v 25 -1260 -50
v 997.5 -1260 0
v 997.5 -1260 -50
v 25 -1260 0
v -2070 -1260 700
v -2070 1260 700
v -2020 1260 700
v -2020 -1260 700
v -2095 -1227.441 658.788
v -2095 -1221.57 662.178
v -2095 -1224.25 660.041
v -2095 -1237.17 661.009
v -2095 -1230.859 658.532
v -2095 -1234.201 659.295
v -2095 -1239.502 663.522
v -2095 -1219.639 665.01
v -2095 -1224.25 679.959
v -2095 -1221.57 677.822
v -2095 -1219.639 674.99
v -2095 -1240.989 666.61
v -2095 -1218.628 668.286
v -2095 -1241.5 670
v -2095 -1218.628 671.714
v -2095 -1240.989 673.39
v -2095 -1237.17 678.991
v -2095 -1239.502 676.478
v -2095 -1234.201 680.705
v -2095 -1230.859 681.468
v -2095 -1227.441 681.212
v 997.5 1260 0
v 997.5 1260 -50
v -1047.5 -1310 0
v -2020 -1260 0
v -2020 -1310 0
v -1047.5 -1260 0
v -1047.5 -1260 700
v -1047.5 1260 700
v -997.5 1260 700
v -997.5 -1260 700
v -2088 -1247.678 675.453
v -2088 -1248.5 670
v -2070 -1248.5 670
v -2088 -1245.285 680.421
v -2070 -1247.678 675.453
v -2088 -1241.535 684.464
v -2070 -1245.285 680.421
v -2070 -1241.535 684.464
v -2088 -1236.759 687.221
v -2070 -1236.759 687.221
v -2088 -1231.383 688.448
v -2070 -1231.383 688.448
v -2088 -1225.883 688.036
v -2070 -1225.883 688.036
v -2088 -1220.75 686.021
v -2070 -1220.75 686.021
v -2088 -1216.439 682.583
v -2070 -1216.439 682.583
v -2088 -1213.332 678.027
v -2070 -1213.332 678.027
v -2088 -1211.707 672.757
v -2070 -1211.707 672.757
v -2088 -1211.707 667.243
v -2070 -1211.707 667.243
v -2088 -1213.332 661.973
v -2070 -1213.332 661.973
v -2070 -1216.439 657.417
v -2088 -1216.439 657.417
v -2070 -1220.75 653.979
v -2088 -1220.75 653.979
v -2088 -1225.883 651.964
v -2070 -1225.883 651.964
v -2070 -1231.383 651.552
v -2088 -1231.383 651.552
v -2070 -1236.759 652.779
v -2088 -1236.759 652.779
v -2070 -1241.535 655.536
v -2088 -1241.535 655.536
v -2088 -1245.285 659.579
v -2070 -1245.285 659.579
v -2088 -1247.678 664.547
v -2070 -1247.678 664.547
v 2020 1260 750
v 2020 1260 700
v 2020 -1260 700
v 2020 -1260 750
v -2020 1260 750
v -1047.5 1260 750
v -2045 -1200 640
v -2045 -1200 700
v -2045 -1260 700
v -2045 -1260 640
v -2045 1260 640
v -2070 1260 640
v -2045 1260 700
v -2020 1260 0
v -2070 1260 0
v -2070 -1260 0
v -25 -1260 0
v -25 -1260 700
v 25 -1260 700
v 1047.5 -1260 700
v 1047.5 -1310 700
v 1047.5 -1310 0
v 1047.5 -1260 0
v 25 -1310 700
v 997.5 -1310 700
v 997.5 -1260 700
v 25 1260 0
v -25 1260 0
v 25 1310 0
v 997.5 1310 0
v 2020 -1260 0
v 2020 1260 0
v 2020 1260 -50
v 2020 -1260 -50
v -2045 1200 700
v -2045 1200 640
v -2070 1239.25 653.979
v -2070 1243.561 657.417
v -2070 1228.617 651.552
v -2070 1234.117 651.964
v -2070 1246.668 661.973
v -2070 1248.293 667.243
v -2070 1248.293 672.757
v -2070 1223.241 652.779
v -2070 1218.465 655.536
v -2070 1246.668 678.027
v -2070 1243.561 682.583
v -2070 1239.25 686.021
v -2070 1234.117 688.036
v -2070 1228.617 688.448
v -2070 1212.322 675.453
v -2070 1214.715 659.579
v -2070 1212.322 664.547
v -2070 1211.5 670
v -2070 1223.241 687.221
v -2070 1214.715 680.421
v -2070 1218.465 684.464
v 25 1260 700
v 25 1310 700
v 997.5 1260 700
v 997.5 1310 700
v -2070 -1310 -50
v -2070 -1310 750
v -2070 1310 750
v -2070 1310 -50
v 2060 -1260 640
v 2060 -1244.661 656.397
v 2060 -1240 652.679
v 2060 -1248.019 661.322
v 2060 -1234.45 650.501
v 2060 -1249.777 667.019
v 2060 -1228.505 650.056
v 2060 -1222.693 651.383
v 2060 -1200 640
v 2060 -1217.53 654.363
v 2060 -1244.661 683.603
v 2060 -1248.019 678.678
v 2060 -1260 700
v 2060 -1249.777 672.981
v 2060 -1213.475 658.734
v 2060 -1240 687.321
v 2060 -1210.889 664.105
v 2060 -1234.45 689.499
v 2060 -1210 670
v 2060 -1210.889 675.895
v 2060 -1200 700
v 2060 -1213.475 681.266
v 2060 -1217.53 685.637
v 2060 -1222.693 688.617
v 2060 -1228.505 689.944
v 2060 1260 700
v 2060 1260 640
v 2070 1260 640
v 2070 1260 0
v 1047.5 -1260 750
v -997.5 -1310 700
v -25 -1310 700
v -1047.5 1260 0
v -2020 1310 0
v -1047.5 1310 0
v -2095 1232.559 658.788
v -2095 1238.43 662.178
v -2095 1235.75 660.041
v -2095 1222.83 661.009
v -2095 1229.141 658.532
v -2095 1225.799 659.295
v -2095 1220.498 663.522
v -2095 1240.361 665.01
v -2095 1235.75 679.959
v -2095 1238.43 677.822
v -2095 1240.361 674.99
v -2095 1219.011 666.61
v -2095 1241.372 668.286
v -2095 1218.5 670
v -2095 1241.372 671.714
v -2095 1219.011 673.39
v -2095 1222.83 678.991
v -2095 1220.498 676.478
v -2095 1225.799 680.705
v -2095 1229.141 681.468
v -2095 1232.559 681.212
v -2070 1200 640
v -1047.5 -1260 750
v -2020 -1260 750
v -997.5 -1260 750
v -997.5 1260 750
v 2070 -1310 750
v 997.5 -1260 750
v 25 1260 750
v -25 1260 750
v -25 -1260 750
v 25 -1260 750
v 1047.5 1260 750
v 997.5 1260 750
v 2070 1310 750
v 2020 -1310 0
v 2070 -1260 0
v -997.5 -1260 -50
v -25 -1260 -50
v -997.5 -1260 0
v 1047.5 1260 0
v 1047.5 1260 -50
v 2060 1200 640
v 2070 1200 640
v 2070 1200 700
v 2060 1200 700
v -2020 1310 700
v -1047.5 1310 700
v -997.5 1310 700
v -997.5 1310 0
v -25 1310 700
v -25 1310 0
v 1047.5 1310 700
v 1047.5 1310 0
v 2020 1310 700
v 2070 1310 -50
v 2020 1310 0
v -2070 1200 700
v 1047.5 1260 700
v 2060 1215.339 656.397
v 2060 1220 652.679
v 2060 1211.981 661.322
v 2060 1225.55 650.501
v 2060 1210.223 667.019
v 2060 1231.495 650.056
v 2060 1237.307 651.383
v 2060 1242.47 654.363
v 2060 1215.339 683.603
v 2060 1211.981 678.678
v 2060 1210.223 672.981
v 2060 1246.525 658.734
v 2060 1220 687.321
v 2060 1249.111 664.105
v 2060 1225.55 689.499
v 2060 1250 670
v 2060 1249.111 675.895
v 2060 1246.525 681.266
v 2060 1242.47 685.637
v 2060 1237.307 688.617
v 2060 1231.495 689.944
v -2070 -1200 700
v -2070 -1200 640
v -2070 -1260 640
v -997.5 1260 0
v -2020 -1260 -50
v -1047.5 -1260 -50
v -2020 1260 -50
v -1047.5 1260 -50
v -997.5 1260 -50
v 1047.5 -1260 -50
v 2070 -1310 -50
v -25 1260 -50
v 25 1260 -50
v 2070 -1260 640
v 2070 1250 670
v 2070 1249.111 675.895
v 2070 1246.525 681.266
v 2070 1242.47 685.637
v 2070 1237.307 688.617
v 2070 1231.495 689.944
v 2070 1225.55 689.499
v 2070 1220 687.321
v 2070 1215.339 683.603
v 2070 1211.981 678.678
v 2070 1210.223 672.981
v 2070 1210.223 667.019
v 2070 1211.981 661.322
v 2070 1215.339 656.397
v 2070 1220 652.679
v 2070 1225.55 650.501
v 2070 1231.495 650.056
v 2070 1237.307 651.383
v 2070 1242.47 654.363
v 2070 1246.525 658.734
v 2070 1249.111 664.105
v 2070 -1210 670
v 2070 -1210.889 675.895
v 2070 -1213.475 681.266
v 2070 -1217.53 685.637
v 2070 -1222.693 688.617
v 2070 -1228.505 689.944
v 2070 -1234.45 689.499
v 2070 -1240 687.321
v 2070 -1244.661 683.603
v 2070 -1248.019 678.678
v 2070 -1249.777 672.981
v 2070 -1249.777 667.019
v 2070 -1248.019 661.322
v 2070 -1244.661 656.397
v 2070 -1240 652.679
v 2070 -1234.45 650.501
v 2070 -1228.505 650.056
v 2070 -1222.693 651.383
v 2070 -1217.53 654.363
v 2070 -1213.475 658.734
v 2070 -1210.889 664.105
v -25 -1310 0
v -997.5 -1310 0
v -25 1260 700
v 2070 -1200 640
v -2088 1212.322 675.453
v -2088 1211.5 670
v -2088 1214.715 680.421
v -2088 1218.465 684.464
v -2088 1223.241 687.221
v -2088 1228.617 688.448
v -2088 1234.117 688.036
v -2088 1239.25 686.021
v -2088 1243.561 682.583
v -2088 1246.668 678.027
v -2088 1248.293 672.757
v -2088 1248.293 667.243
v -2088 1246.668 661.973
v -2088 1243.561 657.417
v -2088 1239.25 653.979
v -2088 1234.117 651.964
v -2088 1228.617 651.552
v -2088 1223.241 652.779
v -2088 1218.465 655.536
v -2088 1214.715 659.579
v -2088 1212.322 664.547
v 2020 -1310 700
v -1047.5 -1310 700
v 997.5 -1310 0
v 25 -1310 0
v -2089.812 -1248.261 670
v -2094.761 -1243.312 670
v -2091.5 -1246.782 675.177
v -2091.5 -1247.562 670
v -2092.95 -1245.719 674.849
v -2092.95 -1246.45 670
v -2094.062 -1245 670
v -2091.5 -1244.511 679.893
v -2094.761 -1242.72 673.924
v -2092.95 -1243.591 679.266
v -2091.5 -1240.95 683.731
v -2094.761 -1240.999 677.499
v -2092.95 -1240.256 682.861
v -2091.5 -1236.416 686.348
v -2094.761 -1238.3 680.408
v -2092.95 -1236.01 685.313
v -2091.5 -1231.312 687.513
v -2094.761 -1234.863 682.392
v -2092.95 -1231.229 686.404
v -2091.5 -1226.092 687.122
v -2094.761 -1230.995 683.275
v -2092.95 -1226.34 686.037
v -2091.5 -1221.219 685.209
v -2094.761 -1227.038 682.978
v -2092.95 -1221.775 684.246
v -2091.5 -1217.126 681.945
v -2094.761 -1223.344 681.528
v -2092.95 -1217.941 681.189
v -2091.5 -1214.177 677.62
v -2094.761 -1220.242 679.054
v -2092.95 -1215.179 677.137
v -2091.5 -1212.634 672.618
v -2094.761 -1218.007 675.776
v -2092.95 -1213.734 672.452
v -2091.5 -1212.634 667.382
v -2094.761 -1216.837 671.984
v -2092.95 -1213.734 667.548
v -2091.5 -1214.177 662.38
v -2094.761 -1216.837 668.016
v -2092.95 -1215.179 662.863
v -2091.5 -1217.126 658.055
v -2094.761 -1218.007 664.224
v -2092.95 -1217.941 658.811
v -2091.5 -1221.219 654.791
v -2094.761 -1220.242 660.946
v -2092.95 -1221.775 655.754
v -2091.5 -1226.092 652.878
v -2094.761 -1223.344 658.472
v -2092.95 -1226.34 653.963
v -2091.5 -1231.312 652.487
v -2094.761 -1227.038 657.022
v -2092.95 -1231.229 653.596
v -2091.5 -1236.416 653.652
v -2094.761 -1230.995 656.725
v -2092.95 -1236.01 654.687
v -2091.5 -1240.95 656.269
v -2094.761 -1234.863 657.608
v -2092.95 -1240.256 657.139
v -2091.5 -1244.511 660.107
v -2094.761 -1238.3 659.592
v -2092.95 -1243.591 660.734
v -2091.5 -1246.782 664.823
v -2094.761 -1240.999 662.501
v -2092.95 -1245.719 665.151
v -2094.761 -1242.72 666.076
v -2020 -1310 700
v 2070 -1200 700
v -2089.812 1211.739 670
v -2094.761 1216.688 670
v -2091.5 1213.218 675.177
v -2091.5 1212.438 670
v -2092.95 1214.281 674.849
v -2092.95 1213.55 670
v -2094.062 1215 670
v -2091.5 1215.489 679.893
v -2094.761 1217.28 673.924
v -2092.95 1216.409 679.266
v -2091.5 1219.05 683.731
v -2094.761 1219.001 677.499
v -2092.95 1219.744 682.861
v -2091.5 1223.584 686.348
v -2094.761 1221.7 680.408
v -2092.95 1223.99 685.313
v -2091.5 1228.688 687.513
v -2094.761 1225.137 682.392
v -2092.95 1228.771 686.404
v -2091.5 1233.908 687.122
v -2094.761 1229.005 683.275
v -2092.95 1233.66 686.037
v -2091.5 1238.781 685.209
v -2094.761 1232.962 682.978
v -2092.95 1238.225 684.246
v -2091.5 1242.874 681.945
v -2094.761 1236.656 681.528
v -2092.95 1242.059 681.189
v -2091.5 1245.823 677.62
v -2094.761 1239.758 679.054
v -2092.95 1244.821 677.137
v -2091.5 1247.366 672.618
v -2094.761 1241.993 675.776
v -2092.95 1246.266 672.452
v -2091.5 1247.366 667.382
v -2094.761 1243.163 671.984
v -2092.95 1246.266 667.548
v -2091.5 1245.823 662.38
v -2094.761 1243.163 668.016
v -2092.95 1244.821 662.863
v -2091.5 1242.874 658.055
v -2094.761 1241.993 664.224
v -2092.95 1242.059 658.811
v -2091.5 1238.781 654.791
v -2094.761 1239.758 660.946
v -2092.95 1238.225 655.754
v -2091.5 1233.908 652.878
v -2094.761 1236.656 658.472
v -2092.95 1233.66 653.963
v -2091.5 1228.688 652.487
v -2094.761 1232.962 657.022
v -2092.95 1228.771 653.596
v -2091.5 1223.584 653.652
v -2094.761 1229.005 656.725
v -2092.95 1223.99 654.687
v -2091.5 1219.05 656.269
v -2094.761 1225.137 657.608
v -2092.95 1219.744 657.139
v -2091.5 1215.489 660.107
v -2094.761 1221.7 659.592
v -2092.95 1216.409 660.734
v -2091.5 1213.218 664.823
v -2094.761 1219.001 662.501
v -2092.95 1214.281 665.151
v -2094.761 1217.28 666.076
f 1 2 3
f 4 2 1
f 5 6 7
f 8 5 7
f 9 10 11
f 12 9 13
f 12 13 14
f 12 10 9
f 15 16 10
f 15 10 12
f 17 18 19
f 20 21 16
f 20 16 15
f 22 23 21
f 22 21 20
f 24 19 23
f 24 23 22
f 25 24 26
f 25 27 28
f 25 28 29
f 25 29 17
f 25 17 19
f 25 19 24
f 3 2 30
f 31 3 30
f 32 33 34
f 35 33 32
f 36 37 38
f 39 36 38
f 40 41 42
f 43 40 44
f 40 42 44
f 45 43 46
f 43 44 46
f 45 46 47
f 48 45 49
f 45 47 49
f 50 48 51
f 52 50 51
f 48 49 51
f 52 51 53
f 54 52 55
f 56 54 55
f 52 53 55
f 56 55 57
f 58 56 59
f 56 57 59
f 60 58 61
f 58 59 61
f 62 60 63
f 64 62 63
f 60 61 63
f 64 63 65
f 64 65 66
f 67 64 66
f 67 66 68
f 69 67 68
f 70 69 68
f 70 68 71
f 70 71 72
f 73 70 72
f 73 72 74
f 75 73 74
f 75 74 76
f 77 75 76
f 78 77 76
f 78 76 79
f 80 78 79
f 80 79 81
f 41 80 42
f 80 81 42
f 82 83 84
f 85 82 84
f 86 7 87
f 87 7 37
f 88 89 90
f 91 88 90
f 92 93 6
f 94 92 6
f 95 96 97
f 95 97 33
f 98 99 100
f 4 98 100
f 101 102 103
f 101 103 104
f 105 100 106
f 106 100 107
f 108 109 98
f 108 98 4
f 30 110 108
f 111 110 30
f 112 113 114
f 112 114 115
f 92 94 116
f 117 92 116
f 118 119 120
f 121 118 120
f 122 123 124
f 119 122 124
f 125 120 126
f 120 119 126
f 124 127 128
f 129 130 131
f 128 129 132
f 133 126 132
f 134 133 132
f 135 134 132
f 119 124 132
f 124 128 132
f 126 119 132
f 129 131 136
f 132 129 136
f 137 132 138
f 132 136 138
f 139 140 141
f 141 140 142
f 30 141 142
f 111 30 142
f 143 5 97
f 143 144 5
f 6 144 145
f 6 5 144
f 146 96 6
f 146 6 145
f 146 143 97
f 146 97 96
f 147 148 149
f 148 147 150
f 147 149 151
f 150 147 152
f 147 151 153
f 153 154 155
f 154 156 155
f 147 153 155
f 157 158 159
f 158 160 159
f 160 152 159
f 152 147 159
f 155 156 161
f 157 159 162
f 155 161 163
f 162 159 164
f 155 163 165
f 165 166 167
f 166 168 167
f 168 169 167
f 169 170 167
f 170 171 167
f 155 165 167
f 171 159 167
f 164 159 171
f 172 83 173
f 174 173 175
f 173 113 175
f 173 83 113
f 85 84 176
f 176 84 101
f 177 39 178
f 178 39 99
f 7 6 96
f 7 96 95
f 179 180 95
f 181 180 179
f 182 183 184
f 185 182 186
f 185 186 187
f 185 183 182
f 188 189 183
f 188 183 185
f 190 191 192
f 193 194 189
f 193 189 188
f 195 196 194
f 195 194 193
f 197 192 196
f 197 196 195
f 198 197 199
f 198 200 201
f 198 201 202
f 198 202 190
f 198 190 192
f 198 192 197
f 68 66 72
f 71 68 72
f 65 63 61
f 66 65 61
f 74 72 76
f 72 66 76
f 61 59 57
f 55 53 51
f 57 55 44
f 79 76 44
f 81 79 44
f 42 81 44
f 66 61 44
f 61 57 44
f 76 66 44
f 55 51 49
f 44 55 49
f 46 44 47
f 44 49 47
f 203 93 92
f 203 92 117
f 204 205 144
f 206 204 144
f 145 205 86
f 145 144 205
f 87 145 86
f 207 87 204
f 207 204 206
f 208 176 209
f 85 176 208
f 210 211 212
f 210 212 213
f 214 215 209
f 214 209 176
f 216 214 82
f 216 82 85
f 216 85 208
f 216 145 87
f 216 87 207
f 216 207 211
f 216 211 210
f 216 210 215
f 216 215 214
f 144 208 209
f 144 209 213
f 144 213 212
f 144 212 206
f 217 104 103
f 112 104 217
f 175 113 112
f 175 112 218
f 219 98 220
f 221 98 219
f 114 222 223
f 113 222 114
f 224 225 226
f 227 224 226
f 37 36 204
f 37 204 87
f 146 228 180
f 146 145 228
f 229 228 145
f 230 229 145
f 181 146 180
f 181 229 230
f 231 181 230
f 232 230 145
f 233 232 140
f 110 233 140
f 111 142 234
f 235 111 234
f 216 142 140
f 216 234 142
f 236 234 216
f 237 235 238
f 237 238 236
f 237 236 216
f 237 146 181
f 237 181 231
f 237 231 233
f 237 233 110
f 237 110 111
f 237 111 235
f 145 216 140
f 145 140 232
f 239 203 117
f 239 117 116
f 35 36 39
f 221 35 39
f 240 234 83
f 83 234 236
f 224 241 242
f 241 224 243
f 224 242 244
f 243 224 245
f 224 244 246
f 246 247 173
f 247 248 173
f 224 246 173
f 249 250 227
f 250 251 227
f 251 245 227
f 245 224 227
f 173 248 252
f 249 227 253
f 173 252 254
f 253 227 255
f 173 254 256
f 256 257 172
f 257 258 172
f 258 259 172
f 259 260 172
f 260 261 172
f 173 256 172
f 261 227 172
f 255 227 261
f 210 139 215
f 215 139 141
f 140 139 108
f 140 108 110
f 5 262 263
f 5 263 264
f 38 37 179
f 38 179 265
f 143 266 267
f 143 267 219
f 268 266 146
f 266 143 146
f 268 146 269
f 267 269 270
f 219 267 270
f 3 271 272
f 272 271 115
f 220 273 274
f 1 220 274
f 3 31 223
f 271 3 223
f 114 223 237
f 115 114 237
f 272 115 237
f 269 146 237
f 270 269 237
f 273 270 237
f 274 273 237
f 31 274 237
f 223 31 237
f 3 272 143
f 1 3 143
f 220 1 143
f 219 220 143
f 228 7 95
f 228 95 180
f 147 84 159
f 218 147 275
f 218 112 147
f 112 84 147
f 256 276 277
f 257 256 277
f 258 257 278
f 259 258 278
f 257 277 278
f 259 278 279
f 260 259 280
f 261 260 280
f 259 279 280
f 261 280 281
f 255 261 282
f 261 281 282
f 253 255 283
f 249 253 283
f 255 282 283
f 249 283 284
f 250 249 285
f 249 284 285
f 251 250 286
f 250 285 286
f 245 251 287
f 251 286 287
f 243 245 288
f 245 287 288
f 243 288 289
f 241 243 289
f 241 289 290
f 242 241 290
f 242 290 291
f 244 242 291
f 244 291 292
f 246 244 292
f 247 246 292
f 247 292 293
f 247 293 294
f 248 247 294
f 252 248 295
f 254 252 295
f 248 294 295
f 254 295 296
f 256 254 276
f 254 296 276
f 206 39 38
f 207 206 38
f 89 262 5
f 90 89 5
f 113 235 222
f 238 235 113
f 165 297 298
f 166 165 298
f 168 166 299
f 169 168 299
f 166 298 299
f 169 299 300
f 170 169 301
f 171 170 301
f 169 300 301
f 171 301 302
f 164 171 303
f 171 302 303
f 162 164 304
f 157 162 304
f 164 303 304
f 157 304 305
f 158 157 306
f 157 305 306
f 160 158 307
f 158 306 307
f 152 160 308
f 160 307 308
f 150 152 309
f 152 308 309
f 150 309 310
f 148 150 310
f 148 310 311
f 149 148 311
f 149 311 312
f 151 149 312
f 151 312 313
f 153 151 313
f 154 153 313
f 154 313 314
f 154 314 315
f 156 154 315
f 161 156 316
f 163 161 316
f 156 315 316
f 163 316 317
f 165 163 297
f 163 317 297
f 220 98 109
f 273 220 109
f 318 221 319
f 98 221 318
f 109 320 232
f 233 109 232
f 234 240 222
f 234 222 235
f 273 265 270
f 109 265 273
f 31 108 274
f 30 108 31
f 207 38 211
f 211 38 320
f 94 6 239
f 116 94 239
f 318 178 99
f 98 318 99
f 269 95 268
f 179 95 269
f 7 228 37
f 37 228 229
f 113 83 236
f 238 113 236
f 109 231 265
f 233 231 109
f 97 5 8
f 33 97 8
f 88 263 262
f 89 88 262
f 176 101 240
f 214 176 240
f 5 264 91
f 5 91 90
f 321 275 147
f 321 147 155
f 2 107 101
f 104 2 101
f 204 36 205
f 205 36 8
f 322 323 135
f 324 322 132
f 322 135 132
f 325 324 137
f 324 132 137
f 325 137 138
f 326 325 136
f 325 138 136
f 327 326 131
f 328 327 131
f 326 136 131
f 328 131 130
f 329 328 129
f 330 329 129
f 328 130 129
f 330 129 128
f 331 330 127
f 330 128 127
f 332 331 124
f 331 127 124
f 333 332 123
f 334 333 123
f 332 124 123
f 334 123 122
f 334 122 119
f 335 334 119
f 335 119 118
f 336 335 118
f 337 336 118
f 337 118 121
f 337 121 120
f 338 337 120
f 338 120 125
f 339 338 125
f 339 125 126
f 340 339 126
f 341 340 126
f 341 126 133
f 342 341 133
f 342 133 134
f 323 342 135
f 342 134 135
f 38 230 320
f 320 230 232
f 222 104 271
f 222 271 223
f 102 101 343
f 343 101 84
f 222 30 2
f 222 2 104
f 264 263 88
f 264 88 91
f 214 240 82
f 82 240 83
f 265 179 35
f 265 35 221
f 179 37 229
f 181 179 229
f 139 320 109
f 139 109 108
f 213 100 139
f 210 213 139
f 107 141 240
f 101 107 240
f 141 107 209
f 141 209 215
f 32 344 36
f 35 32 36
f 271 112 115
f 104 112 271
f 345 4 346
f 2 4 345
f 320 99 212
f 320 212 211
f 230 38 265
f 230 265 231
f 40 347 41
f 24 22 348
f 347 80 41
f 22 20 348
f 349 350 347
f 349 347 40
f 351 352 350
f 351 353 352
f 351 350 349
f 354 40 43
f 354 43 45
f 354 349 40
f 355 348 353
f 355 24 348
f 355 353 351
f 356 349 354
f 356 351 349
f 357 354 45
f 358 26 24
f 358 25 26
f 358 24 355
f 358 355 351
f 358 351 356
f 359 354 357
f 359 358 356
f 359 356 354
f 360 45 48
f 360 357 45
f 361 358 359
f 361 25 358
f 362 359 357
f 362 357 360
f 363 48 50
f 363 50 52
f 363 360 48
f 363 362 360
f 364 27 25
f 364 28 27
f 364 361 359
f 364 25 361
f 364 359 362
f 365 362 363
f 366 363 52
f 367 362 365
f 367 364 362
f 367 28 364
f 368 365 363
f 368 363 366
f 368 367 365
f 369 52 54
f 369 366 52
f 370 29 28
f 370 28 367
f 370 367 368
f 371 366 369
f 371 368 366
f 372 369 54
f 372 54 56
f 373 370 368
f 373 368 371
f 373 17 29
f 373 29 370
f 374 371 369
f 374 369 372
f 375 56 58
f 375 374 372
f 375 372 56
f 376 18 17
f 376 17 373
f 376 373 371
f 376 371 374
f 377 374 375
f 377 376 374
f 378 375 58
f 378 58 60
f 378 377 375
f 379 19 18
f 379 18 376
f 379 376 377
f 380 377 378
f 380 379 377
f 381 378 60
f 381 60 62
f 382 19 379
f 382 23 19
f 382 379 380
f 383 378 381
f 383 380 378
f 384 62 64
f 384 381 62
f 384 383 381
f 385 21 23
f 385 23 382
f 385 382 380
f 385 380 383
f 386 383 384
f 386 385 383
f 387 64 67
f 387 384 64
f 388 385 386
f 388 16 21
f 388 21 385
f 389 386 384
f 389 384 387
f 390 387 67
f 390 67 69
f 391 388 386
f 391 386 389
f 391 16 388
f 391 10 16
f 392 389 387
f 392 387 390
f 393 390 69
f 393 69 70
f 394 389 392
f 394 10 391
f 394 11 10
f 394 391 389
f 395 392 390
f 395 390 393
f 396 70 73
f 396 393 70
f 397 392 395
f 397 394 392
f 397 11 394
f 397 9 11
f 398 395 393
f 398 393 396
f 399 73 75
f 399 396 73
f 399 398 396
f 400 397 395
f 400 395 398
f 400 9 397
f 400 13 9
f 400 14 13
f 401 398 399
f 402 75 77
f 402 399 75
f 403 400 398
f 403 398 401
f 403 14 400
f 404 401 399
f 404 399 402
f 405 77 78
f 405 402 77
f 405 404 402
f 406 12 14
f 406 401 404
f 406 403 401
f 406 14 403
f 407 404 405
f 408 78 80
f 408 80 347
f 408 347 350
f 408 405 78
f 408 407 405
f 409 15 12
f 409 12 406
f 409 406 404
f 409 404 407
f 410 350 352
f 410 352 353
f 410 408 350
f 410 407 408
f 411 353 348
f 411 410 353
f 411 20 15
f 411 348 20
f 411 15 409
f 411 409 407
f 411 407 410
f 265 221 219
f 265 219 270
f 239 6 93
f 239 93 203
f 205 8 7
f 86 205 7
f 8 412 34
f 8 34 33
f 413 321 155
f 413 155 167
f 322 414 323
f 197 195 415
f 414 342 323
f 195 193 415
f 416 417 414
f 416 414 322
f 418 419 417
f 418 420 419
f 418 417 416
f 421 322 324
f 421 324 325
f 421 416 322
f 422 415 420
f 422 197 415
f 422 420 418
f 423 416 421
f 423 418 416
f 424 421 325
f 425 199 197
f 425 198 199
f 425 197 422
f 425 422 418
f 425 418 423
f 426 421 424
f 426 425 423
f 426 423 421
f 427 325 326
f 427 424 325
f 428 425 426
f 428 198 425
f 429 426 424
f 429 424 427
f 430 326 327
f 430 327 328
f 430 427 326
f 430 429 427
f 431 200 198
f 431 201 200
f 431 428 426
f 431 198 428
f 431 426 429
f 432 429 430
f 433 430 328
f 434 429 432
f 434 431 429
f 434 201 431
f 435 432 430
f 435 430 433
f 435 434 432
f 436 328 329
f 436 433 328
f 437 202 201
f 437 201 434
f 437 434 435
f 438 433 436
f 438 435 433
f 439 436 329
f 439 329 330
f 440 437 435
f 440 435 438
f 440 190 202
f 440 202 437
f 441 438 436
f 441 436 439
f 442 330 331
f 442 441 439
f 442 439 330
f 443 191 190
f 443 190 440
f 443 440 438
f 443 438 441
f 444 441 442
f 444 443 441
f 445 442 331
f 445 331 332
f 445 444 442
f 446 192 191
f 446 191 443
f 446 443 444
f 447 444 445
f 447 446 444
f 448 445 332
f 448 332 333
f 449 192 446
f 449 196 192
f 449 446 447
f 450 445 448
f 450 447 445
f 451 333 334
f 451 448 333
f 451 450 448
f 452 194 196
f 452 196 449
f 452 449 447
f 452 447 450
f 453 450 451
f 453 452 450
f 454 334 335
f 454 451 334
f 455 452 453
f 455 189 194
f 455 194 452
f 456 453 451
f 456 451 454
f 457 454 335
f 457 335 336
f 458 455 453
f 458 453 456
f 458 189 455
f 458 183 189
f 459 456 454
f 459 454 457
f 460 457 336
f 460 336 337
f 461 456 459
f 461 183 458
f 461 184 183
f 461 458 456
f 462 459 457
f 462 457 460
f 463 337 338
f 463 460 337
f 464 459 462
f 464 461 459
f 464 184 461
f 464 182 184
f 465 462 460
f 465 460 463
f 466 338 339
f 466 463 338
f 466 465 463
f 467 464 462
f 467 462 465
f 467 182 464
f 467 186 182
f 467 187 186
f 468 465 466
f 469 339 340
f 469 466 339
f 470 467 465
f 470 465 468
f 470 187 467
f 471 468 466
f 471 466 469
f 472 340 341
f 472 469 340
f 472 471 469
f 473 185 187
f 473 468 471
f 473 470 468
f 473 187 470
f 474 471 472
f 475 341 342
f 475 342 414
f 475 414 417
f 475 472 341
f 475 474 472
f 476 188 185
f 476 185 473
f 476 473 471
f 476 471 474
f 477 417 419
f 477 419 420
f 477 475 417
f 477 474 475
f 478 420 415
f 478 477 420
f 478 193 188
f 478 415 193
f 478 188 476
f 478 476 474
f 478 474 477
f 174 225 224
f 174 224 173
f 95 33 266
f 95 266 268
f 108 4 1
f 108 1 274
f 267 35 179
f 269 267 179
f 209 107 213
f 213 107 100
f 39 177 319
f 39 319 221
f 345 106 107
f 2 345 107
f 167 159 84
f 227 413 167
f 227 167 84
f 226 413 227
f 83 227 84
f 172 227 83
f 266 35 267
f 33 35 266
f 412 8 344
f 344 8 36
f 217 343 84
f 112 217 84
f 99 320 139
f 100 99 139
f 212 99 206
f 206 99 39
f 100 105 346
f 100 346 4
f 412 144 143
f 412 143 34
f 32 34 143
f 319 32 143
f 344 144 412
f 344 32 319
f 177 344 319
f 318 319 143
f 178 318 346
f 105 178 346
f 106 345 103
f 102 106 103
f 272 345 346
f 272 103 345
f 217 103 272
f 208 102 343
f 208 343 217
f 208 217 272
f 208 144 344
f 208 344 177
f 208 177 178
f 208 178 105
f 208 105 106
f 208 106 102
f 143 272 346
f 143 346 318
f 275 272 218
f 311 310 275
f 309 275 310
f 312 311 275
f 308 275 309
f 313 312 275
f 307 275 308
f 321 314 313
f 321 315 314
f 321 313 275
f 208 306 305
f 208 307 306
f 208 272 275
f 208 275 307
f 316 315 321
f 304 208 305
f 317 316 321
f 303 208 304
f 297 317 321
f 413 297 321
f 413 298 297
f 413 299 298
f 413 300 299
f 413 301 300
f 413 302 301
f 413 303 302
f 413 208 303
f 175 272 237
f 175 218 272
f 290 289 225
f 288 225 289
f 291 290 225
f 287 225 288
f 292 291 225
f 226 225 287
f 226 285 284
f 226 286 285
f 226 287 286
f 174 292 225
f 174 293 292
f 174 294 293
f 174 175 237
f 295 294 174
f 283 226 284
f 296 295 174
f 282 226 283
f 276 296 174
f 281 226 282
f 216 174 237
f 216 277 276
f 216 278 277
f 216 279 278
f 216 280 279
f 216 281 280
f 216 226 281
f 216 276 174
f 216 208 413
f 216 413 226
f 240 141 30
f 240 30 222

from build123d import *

# Parameters (mm, degrees)
F0_W      = 4140
F0_H      = 2620
F0_W_2    = 50
F0_H_2    = 2520
F1_DEPTH  = 50
F2_W      = 50
F2_H      = 50
F3_DEPTH  = 700
F7_W      = 2620
F7_H      = 800
F7_W_2    = 60
F7_H_2    = 60
F7_R      = 20
F8_DEPTH  = 10
F9_W      = 60
F9_H      = 60
F9_R      = 18.5
F10_DEPTH = 25
F11_DEPTH = 25
F12_R     = 7
F12_2_R   = 7


# Not quite as in the source:
# - a feature names something its author has since deleted; it is built from what else it names


with BuildPart() as f1:
    # F0 (on Top) → F1 (new body)
    with BuildSketch(Plane.XY):
        Rectangle(F0_W, F0_H)
        Polygon((1047.5, 1260), (2020, 1260), (2020, -1260), (1047.5, -1260), (997.5, -1260), (25, -1260), (-25, -1260), (-997.5, -1260), (-1047.5, -1260), (-2020, -1260), (-2020, 1260), (-1047.5, 1260), (-997.5, 1260), (-25, 1260), (25, 1260), (997.5, 1260), align=None, mode=Mode.SUBTRACT)
        with Locations((-1022.5, 0)):
            Rectangle(F0_W_2, F0_H_2)
        Rectangle(F0_W_2, F0_H_2)
        with Locations((1022.5, 0)):
            Rectangle(F0_W_2, F0_H_2)
    extrude(amount=-F1_DEPTH)

    # F2 (on face) → F3 (join)
    with BuildSketch(Plane.XY):
        with Locations((-2045, 1285)):
            Rectangle(F2_W, F2_H)
        with Locations((-1022.5, 1285)):
            Rectangle(F2_W, F2_H)
        with Locations((0, 1285)):
            Rectangle(F2_W, F2_H)
        with Locations((1022.5, 1285)):
            Rectangle(F2_W, F2_H)
        with Locations((2045, 1285)):
            Rectangle(F2_W, F2_H)
        with Locations((2045, -1285)):
            Rectangle(F2_W, F2_H)
        with Locations((1022.5, -1285)):
            Rectangle(F2_W, F2_H)
        with Locations((0, -1285)):
            Rectangle(F2_W, F2_H)
        with Locations((-1022.5, -1285)):
            Rectangle(F2_W, F2_H)
        with Locations((-2045, -1285)):
            Rectangle(F2_W, F2_H)
    extrude(amount=F3_DEPTH)

    # F6: F1 across plane


with BuildPart() as f1_1:
    add(f1.part)
    add(f1.part.mirror(Plane.XY.offset(350)))

    # F7 (on face) → F8 (join)
    with BuildSketch(Plane.YZ.offset(2070)):
        with Locations((0, 350)):
            Rectangle(F7_W, F7_H)
        Polygon((1200, 700), (1260, 700), (1260, 640), (1260, 0), (-1260, 0), (-1260, 640), (-1260, 700), (-1200, 700), align=None, mode=Mode.SUBTRACT)
        with Locations((1230, 670)):
            Rectangle(F7_W_2, F7_H_2)
        with Locations((1230, 670)):
            Circle(F7_R, mode=Mode.SUBTRACT)
        with Locations((-1230, 670)):
            Rectangle(F7_W_2, F7_H_2)
        with Locations((-1230, 670)):
            Circle(F7_R, mode=Mode.SUBTRACT)
    extrude(amount=-F8_DEPTH)


with BuildPart() as f10:
    # F9 (on face) → F10 (new body)
    with BuildSketch(Plane(origin=(-2070, 0, 0), x_dir=(0, -1, 0), z_dir=(-1, 0, 0))):
        with Locations((-1230, 670)):
            Rectangle(F9_W, F9_H)
        with Locations((-1230, 670)):
            Circle(F9_R, mode=Mode.SUBTRACT)
        with Locations((-1230, 670)):
            Circle(F9_R)
    extrude(amount=-F10_DEPTH)


with BuildPart() as f10b:
    # F9 (on face) → F10, piece 2 (new body)
    with BuildSketch(Plane(origin=(-2070, 0, 0), x_dir=(0, -1, 0), z_dir=(-1, 0, 0))):
        with Locations((1230, 670)):
            Rectangle(F9_W, F9_H)
        with Locations((1230, 670)):
            Circle(F9_R, mode=Mode.SUBTRACT)
        with Locations((1230, 670)):
            Circle(F9_R)
    extrude(amount=-F10_DEPTH)


with BuildPart() as f11:
    # F9 (on face) → F11 (new body)
    with BuildSketch(Plane(origin=(-2070, 0, 0), x_dir=(0, -1, 0), z_dir=(-1, 0, 0))):
        with Locations((-1230, 670)):
            Circle(F9_R)
    extrude(amount=F11_DEPTH)

    # F12
    f12_edges = [f11.edges().sort_by_distance(p)[0] for p in [
        (-2095, 1248.5, 670),
    ]]
    fillet(f12_edges, radius=F12_R)


with BuildPart() as f11b:
    # F9 (on face) → F11, piece 2 (new body)
    with BuildSketch(Plane(origin=(-2070, 0, 0), x_dir=(0, -1, 0), z_dir=(-1, 0, 0))):
        with Locations((1230, 670)):
            Circle(F9_R)
    extrude(amount=F11_DEPTH)

    # F12#2
    f12_2_edges = [f11b.edges().sort_by_distance(p)[0] for p in [
        (-2095, -1211.5, 670),
    ]]
    fillet(f12_2_edges, radius=F12_2_R)


solid = Compound([f1_1.part, f10.part, f10b.part, f11.part, f11b.part])
